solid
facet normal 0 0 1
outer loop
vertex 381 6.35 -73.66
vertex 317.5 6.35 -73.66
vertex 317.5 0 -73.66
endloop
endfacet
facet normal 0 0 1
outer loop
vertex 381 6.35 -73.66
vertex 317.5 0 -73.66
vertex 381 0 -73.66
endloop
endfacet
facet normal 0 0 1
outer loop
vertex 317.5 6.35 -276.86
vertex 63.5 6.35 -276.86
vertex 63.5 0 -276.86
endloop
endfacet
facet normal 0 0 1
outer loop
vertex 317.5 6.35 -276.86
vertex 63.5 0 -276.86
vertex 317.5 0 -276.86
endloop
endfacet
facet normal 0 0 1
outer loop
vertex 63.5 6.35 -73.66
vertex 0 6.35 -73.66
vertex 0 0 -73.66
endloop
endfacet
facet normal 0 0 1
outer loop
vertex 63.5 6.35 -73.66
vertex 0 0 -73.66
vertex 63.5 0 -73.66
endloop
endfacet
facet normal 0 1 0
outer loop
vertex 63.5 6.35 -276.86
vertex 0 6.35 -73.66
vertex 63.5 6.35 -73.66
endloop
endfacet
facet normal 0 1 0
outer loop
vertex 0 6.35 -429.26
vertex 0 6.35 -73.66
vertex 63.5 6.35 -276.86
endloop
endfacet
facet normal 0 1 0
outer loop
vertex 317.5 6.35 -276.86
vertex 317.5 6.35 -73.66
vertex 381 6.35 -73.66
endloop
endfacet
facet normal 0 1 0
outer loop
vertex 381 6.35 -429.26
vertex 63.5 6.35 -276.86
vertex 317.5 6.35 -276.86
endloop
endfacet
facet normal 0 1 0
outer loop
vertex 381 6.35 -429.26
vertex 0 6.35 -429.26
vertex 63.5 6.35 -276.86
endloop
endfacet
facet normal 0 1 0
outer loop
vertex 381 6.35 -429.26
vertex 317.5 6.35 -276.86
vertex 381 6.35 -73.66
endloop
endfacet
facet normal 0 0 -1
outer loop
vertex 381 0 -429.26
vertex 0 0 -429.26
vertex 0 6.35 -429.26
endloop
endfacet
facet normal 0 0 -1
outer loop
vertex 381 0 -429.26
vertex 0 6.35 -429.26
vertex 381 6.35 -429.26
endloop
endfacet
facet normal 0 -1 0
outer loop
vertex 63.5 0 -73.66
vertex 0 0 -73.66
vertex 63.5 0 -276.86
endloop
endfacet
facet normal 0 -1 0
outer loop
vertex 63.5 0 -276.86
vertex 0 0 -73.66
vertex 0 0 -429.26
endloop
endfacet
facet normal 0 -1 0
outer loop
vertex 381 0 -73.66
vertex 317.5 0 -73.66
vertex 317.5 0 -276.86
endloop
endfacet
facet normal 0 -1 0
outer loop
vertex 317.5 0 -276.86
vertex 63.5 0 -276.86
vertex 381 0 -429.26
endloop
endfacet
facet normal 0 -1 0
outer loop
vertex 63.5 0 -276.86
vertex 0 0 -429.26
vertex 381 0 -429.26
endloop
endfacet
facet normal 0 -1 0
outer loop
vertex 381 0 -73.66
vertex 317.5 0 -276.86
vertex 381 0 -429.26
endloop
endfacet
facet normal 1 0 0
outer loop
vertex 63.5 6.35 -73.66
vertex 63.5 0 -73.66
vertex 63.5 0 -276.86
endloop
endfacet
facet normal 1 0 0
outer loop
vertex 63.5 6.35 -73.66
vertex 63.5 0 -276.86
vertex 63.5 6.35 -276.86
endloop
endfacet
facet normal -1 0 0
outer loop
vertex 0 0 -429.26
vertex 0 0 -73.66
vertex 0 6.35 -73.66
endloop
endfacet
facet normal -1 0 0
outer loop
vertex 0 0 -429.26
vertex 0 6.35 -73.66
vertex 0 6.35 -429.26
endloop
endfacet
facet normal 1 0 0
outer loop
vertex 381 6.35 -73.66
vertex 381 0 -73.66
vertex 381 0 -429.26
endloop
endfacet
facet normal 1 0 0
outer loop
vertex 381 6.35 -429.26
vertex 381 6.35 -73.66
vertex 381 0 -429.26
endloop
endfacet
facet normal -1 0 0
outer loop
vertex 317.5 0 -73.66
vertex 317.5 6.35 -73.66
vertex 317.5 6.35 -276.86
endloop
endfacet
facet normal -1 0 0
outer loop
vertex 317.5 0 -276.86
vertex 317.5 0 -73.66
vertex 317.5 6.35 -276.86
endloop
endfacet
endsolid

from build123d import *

# Parameters (mm, degrees)
SKETCH1_W           = 381
SKETCH1_H           = 429.26
BOSS_EXTRUDE1_DEPTH = 6.35
SKETCH2_W           = 254
SKETCH2_H           = 203.2
CUT_EXTRUDE1_DEPTH  = 6.35
SKETCH3_W           = 381
SKETCH3_H           = 73.66
CUT_EXTRUDE2_DEPTH  = 6.35
SKETCH4_W           = 254
SKETCH4_H           = 6.35
CUT_EXTRUDE3_DEPTH  = 73.66


with BuildPart() as part:
    # Sketch1 → Boss-Extrude1 (new body)
    with BuildSketch(Plane(origin=(0, 0, 0), x_dir=(1, 0, 0), z_dir=(0, 1, 0))):
        with Locations((190.5, 214.63)):
            Rectangle(SKETCH1_W, SKETCH1_H)
    extrude(amount=BOSS_EXTRUDE1_DEPTH)

    # Sketch2 → Cut-Extrude1 (cut)
    with BuildSketch(Plane(origin=(0, 6.35, 0), x_dir=(1, 0, 0), z_dir=(0, 1, 0))):
        with Locations((190.5, 101.6)):
            Rectangle(SKETCH2_W, SKETCH2_H)
    extrude(amount=-CUT_EXTRUDE1_DEPTH, mode=Mode.SUBTRACT)

    # Sketch3 → Cut-Extrude2 (cut)
    with BuildSketch(Plane(origin=(0, 6.35, 0), x_dir=(1, 0, 0), z_dir=(0, 1, 0))):
        with Locations((190.5, 36.83)):
            Rectangle(SKETCH3_W, SKETCH3_H)
    extrude(amount=-CUT_EXTRUDE2_DEPTH, mode=Mode.SUBTRACT)

    # Sketch4 → Cut-Extrude3 (cut)
    with BuildSketch(Plane.XY.offset(-203.2)):
        with Locations((190.5, 3.175)):
            Rectangle(SKETCH4_W, SKETCH4_H)
    extrude(amount=-CUT_EXTRUDE3_DEPTH, mode=Mode.SUBTRACT)


solid = part.part
